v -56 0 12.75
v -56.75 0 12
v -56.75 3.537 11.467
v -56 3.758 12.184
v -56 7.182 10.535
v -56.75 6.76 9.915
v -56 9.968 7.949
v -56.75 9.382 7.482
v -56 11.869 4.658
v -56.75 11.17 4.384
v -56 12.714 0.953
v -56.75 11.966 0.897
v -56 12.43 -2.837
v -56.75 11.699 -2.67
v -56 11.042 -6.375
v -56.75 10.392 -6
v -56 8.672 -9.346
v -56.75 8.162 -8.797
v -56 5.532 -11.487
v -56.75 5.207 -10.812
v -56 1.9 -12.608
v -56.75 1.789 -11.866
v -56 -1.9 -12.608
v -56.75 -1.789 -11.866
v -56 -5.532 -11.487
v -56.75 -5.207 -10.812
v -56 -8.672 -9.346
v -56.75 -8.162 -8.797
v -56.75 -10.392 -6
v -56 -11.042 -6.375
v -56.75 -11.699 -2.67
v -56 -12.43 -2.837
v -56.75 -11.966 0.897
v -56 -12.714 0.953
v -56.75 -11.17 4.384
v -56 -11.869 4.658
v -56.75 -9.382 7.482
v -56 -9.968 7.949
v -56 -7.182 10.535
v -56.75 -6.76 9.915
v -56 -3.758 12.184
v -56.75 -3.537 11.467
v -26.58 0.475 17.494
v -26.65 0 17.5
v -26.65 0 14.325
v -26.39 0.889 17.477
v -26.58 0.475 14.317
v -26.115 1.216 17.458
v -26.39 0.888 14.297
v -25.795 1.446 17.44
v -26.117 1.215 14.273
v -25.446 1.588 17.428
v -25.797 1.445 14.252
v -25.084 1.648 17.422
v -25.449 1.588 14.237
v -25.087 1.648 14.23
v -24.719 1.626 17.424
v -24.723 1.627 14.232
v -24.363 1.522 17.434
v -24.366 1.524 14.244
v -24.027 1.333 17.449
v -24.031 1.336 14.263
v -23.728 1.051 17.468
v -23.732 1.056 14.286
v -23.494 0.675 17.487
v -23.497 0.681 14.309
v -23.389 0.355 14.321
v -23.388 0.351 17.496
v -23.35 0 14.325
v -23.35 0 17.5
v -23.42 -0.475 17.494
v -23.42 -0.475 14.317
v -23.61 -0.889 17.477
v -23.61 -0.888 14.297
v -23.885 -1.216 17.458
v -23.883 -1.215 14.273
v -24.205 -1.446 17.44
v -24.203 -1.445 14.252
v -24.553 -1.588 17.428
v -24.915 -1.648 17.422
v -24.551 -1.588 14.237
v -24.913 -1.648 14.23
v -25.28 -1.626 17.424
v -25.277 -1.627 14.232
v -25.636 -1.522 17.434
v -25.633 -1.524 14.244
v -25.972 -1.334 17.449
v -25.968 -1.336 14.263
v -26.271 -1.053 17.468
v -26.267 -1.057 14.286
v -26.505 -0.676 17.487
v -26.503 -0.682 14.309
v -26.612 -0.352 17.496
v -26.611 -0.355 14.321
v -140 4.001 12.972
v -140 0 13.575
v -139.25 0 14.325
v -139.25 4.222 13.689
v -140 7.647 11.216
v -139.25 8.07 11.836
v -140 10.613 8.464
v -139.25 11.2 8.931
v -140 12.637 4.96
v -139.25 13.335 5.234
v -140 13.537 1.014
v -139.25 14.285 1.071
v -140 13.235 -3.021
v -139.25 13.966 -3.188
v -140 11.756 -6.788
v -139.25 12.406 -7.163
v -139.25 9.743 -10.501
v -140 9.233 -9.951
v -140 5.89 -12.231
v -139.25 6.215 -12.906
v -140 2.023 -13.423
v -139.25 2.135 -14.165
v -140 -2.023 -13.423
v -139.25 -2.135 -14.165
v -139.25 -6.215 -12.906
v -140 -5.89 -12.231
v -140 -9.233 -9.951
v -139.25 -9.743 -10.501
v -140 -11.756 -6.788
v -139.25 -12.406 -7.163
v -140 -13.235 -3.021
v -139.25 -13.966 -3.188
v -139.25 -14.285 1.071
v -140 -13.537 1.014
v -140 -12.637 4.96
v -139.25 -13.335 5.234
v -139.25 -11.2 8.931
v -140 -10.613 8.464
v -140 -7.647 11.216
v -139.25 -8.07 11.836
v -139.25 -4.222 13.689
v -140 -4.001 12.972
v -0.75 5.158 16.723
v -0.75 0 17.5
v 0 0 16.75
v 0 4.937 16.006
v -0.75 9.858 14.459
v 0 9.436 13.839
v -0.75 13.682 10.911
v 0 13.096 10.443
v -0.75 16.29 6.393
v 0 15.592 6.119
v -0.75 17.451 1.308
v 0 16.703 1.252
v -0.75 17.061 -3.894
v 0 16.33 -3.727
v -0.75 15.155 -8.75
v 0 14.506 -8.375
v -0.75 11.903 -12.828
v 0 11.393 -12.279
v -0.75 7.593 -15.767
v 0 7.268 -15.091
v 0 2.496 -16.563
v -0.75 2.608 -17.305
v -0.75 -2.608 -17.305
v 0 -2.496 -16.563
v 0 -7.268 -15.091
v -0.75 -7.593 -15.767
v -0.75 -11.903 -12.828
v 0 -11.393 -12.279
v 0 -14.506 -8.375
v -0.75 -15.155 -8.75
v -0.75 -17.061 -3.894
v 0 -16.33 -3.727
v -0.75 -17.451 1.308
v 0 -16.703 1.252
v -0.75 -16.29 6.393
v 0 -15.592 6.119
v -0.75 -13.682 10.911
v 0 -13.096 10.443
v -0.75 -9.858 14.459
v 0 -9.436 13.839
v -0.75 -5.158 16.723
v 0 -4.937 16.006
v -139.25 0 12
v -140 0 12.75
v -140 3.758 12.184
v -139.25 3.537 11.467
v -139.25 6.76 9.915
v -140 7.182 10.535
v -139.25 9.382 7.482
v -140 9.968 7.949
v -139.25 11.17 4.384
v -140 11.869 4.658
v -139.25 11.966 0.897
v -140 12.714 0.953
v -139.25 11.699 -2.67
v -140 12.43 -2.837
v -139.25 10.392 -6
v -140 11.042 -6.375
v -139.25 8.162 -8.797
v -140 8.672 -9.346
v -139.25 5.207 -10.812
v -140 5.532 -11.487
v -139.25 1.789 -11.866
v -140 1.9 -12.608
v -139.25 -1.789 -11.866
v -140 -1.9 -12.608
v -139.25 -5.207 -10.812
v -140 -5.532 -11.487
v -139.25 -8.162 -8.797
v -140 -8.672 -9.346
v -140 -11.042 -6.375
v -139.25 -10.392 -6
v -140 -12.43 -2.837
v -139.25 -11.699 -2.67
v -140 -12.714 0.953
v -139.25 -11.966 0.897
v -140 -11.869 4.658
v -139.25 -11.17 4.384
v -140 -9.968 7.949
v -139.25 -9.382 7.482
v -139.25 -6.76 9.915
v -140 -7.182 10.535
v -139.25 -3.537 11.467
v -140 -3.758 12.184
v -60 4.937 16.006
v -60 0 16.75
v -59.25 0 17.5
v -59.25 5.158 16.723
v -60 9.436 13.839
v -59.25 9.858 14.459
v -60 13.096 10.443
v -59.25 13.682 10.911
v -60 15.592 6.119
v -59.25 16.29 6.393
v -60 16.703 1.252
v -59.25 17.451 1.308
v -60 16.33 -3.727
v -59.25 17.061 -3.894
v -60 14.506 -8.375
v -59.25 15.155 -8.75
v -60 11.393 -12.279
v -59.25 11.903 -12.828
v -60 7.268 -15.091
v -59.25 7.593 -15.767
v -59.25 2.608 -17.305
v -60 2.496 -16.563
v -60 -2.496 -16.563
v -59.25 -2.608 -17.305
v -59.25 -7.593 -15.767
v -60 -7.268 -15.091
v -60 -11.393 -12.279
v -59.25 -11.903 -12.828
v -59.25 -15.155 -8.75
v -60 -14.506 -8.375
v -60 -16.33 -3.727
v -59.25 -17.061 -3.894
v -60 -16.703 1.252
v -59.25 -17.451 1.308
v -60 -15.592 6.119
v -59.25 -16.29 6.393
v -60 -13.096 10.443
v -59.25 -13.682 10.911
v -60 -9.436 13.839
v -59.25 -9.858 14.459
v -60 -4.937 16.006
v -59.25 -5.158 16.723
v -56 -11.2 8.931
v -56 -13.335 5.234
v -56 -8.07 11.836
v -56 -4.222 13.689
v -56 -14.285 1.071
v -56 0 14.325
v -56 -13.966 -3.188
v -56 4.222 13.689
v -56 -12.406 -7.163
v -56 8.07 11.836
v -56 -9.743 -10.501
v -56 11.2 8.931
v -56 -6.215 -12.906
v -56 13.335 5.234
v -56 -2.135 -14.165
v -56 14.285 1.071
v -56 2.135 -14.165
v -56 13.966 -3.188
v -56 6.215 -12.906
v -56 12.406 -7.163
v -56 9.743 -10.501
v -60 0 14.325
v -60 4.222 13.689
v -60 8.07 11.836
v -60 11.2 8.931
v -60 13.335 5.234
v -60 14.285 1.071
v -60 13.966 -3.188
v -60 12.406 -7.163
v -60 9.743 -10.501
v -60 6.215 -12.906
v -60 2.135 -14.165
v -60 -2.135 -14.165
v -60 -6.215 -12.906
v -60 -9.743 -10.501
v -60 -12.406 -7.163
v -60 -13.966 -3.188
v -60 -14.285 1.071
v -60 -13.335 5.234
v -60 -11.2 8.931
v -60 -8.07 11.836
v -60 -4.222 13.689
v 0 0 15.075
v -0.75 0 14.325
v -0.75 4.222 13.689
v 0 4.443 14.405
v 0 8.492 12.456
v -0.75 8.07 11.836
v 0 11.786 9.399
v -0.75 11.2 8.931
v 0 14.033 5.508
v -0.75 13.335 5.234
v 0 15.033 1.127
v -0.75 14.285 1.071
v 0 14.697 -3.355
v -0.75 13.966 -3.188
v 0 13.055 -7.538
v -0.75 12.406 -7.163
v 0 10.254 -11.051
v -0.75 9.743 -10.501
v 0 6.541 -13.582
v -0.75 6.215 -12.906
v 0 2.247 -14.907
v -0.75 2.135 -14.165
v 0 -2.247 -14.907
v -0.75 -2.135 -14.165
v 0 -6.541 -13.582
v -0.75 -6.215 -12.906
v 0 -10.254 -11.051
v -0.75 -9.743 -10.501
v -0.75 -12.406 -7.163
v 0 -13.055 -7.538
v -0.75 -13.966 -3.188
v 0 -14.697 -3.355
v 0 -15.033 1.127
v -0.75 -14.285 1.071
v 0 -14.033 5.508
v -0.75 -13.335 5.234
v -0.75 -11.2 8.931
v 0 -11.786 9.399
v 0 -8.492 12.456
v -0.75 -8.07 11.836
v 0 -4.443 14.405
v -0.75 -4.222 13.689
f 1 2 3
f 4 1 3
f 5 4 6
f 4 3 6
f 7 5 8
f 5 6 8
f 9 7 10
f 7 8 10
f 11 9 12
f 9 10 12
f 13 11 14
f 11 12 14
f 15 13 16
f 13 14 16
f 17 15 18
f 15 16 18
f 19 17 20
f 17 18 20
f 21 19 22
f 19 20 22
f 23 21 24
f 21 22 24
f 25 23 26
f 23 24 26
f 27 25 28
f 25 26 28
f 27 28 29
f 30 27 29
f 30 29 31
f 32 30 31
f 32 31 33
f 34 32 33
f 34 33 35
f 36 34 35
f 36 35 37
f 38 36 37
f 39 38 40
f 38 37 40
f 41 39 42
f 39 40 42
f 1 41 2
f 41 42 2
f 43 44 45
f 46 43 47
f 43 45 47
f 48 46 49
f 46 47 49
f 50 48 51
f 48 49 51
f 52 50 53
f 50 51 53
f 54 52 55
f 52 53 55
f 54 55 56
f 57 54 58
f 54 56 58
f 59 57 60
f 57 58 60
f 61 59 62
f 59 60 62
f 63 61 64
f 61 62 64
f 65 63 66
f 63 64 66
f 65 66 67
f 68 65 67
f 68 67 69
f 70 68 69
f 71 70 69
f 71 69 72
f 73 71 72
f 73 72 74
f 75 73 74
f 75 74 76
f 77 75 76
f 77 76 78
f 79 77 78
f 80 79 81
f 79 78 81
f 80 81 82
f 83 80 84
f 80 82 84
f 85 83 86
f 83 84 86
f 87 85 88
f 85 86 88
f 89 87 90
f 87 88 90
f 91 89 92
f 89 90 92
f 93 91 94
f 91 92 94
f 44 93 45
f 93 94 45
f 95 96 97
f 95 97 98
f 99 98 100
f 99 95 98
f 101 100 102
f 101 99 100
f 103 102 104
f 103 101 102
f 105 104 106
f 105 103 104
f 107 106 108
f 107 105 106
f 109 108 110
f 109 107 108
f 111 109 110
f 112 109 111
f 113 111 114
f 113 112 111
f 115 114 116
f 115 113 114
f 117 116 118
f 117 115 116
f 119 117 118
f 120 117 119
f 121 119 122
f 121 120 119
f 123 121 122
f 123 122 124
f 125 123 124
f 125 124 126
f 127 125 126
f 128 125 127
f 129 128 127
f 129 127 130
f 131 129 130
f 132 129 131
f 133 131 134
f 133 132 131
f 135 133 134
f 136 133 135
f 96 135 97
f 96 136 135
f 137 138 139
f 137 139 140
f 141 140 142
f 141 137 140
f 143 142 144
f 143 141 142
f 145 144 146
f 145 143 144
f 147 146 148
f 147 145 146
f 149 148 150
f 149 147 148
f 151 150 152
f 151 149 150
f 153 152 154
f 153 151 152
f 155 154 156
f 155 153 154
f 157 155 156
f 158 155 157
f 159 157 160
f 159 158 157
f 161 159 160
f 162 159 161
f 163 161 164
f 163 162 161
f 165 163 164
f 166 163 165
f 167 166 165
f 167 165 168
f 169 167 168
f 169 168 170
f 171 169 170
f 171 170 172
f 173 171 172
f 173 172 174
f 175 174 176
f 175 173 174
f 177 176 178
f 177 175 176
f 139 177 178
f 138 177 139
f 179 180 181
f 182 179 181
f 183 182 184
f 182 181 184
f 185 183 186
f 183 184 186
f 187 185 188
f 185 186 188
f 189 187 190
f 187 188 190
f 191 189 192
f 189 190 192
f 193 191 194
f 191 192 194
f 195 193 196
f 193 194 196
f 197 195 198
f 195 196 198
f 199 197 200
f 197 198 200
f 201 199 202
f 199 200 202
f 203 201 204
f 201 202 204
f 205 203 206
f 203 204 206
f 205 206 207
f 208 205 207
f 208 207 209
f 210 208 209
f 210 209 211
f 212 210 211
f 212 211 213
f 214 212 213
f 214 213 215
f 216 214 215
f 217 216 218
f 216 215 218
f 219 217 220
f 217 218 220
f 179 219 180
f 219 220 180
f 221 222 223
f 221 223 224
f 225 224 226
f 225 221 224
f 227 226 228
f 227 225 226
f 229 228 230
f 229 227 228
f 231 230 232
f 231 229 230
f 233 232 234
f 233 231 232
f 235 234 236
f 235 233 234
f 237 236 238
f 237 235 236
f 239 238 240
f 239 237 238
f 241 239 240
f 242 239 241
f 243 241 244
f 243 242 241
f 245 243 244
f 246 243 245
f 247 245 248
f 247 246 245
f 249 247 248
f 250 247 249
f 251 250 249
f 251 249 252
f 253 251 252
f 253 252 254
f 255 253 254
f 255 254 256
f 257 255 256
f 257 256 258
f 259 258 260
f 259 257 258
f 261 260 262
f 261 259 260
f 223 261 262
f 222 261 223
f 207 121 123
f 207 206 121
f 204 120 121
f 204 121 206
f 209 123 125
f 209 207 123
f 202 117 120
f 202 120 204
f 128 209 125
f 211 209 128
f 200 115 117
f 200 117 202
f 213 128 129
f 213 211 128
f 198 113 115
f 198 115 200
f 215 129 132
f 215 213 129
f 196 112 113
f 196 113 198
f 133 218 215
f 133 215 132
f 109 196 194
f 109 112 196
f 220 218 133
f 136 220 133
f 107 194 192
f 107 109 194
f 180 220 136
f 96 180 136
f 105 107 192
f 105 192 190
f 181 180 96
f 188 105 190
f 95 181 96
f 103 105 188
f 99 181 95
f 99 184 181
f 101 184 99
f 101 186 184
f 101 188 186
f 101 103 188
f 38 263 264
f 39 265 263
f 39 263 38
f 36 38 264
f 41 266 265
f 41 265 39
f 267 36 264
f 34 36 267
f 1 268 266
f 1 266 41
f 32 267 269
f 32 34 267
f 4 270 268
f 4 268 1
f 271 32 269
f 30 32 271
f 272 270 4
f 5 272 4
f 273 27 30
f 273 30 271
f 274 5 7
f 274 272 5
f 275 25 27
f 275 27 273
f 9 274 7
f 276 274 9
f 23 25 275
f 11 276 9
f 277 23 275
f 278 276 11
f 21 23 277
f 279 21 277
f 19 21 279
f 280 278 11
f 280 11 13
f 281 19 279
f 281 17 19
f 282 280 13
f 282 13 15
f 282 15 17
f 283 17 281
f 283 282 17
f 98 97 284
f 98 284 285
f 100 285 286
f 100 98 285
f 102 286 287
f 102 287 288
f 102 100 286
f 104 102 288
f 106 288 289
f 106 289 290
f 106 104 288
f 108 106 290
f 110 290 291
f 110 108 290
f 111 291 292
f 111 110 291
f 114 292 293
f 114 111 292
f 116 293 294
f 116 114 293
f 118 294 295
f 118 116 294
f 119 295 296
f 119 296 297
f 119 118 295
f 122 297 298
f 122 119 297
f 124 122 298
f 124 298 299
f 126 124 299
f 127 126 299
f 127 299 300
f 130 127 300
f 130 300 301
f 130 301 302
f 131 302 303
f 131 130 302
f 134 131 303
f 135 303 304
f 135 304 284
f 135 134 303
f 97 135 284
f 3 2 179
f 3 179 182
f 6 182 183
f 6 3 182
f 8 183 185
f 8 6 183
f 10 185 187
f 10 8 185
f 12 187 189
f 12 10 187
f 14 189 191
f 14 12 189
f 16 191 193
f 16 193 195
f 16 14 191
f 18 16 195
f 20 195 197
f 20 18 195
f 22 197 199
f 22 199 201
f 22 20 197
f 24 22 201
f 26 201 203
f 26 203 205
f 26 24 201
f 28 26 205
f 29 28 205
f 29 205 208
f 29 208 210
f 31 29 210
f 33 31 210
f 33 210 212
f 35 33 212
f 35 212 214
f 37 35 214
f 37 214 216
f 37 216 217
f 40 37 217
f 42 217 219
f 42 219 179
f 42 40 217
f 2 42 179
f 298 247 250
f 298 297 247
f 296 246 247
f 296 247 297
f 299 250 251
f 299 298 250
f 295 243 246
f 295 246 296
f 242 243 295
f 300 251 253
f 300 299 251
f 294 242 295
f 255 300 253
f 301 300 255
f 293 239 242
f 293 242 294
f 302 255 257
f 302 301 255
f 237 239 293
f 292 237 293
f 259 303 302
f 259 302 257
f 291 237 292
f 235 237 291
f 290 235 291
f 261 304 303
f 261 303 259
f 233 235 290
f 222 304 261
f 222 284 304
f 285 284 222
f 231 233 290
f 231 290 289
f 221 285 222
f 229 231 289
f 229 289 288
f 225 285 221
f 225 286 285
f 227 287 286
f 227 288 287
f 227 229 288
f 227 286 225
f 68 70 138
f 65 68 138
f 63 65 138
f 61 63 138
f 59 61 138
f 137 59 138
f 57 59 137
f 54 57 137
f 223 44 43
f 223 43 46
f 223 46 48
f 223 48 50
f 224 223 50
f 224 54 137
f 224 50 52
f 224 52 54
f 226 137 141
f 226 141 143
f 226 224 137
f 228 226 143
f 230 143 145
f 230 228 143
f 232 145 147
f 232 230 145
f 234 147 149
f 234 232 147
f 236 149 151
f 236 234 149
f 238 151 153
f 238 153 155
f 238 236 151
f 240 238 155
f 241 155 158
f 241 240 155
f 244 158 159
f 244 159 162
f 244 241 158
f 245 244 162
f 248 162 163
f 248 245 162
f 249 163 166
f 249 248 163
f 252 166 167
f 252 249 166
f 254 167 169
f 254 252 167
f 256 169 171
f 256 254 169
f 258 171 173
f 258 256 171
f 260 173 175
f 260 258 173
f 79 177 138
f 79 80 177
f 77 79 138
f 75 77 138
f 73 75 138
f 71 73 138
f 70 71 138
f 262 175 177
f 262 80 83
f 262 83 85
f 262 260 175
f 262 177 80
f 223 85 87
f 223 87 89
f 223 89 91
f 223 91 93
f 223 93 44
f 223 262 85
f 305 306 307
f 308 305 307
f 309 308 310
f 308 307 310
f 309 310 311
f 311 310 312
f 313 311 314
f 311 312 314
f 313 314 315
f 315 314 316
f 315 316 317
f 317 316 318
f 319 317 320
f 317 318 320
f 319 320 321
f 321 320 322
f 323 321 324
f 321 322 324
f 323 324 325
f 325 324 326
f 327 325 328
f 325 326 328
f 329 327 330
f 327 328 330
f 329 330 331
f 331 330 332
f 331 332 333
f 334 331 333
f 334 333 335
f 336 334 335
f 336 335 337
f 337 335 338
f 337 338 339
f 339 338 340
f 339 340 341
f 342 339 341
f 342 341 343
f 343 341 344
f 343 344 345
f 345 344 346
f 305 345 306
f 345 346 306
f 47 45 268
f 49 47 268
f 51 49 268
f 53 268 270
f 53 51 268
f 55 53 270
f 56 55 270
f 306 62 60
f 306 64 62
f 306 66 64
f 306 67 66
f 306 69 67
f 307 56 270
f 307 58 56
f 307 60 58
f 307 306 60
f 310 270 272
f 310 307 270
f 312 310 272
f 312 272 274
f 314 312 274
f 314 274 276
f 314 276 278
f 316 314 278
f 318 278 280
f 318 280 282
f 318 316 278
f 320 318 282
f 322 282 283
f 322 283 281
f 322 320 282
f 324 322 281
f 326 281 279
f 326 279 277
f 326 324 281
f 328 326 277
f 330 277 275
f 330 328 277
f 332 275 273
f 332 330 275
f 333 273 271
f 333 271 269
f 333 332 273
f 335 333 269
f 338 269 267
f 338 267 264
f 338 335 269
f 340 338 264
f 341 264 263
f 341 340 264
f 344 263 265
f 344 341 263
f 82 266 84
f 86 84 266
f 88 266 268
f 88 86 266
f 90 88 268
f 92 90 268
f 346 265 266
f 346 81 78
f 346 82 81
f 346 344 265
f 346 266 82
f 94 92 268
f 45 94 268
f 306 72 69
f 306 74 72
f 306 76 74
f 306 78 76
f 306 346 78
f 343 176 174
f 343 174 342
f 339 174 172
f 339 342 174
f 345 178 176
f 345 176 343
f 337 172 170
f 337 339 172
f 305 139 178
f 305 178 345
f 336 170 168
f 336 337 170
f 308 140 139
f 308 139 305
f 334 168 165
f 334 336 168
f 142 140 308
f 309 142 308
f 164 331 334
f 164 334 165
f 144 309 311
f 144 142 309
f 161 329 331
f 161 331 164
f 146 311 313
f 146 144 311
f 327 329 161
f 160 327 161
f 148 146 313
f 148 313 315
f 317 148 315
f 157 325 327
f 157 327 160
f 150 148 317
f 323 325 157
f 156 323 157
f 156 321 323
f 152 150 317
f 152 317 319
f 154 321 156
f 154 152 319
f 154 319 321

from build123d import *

# Parameters (mm, degrees)
F4_D     = 3.3
F4_DEPTH = 8.1
F4_START = 0.0779595
F4_TIP   = 0.9914200214
F5_SIZE  = 0.75


with BuildPart() as f1:
    # F0 (on Front) → F1 (revolve)
    with BuildSketch(Plane.XZ):
        Polygon((0, 14.325), (0, 17.5), (-60, 17.5), (-60, 14.325), (-140, 14.325), (-140, 12), (-56, 12), (-56, 14.325), align=None)
    revolve(axis=Axis((-73.5066011898, 0, 0), (-1, 0, 0)))

    # F4
    # its depths count from where the whole tool has entered the part; down to there all is cleared
    with Locations(Plane.XY.offset(17.5).offset(-F4_START)):
        with Locations((-25, 0)):
            Hole(F4_D / 2, depth=F4_DEPTH)
            with Locations((0, 0, -(F4_DEPTH + F4_TIP / 2))):  # 118° drill point
                Cone(0, F4_D / 2, F4_TIP, mode=Mode.SUBTRACT)

    # F5
    f5_edges = [f1.edges().sort_by_distance(p)[0] for p in [
        (-140, 0, -14.325),
        (-140, 0, -12),
        (-60, 0, -17.5),
        (0, 0, -17.5),
        (0, 0, -14.325),
        (-56, 0, -12),
    ]]
    chamfer(f5_edges, length=F5_SIZE)


solid = f1.part
